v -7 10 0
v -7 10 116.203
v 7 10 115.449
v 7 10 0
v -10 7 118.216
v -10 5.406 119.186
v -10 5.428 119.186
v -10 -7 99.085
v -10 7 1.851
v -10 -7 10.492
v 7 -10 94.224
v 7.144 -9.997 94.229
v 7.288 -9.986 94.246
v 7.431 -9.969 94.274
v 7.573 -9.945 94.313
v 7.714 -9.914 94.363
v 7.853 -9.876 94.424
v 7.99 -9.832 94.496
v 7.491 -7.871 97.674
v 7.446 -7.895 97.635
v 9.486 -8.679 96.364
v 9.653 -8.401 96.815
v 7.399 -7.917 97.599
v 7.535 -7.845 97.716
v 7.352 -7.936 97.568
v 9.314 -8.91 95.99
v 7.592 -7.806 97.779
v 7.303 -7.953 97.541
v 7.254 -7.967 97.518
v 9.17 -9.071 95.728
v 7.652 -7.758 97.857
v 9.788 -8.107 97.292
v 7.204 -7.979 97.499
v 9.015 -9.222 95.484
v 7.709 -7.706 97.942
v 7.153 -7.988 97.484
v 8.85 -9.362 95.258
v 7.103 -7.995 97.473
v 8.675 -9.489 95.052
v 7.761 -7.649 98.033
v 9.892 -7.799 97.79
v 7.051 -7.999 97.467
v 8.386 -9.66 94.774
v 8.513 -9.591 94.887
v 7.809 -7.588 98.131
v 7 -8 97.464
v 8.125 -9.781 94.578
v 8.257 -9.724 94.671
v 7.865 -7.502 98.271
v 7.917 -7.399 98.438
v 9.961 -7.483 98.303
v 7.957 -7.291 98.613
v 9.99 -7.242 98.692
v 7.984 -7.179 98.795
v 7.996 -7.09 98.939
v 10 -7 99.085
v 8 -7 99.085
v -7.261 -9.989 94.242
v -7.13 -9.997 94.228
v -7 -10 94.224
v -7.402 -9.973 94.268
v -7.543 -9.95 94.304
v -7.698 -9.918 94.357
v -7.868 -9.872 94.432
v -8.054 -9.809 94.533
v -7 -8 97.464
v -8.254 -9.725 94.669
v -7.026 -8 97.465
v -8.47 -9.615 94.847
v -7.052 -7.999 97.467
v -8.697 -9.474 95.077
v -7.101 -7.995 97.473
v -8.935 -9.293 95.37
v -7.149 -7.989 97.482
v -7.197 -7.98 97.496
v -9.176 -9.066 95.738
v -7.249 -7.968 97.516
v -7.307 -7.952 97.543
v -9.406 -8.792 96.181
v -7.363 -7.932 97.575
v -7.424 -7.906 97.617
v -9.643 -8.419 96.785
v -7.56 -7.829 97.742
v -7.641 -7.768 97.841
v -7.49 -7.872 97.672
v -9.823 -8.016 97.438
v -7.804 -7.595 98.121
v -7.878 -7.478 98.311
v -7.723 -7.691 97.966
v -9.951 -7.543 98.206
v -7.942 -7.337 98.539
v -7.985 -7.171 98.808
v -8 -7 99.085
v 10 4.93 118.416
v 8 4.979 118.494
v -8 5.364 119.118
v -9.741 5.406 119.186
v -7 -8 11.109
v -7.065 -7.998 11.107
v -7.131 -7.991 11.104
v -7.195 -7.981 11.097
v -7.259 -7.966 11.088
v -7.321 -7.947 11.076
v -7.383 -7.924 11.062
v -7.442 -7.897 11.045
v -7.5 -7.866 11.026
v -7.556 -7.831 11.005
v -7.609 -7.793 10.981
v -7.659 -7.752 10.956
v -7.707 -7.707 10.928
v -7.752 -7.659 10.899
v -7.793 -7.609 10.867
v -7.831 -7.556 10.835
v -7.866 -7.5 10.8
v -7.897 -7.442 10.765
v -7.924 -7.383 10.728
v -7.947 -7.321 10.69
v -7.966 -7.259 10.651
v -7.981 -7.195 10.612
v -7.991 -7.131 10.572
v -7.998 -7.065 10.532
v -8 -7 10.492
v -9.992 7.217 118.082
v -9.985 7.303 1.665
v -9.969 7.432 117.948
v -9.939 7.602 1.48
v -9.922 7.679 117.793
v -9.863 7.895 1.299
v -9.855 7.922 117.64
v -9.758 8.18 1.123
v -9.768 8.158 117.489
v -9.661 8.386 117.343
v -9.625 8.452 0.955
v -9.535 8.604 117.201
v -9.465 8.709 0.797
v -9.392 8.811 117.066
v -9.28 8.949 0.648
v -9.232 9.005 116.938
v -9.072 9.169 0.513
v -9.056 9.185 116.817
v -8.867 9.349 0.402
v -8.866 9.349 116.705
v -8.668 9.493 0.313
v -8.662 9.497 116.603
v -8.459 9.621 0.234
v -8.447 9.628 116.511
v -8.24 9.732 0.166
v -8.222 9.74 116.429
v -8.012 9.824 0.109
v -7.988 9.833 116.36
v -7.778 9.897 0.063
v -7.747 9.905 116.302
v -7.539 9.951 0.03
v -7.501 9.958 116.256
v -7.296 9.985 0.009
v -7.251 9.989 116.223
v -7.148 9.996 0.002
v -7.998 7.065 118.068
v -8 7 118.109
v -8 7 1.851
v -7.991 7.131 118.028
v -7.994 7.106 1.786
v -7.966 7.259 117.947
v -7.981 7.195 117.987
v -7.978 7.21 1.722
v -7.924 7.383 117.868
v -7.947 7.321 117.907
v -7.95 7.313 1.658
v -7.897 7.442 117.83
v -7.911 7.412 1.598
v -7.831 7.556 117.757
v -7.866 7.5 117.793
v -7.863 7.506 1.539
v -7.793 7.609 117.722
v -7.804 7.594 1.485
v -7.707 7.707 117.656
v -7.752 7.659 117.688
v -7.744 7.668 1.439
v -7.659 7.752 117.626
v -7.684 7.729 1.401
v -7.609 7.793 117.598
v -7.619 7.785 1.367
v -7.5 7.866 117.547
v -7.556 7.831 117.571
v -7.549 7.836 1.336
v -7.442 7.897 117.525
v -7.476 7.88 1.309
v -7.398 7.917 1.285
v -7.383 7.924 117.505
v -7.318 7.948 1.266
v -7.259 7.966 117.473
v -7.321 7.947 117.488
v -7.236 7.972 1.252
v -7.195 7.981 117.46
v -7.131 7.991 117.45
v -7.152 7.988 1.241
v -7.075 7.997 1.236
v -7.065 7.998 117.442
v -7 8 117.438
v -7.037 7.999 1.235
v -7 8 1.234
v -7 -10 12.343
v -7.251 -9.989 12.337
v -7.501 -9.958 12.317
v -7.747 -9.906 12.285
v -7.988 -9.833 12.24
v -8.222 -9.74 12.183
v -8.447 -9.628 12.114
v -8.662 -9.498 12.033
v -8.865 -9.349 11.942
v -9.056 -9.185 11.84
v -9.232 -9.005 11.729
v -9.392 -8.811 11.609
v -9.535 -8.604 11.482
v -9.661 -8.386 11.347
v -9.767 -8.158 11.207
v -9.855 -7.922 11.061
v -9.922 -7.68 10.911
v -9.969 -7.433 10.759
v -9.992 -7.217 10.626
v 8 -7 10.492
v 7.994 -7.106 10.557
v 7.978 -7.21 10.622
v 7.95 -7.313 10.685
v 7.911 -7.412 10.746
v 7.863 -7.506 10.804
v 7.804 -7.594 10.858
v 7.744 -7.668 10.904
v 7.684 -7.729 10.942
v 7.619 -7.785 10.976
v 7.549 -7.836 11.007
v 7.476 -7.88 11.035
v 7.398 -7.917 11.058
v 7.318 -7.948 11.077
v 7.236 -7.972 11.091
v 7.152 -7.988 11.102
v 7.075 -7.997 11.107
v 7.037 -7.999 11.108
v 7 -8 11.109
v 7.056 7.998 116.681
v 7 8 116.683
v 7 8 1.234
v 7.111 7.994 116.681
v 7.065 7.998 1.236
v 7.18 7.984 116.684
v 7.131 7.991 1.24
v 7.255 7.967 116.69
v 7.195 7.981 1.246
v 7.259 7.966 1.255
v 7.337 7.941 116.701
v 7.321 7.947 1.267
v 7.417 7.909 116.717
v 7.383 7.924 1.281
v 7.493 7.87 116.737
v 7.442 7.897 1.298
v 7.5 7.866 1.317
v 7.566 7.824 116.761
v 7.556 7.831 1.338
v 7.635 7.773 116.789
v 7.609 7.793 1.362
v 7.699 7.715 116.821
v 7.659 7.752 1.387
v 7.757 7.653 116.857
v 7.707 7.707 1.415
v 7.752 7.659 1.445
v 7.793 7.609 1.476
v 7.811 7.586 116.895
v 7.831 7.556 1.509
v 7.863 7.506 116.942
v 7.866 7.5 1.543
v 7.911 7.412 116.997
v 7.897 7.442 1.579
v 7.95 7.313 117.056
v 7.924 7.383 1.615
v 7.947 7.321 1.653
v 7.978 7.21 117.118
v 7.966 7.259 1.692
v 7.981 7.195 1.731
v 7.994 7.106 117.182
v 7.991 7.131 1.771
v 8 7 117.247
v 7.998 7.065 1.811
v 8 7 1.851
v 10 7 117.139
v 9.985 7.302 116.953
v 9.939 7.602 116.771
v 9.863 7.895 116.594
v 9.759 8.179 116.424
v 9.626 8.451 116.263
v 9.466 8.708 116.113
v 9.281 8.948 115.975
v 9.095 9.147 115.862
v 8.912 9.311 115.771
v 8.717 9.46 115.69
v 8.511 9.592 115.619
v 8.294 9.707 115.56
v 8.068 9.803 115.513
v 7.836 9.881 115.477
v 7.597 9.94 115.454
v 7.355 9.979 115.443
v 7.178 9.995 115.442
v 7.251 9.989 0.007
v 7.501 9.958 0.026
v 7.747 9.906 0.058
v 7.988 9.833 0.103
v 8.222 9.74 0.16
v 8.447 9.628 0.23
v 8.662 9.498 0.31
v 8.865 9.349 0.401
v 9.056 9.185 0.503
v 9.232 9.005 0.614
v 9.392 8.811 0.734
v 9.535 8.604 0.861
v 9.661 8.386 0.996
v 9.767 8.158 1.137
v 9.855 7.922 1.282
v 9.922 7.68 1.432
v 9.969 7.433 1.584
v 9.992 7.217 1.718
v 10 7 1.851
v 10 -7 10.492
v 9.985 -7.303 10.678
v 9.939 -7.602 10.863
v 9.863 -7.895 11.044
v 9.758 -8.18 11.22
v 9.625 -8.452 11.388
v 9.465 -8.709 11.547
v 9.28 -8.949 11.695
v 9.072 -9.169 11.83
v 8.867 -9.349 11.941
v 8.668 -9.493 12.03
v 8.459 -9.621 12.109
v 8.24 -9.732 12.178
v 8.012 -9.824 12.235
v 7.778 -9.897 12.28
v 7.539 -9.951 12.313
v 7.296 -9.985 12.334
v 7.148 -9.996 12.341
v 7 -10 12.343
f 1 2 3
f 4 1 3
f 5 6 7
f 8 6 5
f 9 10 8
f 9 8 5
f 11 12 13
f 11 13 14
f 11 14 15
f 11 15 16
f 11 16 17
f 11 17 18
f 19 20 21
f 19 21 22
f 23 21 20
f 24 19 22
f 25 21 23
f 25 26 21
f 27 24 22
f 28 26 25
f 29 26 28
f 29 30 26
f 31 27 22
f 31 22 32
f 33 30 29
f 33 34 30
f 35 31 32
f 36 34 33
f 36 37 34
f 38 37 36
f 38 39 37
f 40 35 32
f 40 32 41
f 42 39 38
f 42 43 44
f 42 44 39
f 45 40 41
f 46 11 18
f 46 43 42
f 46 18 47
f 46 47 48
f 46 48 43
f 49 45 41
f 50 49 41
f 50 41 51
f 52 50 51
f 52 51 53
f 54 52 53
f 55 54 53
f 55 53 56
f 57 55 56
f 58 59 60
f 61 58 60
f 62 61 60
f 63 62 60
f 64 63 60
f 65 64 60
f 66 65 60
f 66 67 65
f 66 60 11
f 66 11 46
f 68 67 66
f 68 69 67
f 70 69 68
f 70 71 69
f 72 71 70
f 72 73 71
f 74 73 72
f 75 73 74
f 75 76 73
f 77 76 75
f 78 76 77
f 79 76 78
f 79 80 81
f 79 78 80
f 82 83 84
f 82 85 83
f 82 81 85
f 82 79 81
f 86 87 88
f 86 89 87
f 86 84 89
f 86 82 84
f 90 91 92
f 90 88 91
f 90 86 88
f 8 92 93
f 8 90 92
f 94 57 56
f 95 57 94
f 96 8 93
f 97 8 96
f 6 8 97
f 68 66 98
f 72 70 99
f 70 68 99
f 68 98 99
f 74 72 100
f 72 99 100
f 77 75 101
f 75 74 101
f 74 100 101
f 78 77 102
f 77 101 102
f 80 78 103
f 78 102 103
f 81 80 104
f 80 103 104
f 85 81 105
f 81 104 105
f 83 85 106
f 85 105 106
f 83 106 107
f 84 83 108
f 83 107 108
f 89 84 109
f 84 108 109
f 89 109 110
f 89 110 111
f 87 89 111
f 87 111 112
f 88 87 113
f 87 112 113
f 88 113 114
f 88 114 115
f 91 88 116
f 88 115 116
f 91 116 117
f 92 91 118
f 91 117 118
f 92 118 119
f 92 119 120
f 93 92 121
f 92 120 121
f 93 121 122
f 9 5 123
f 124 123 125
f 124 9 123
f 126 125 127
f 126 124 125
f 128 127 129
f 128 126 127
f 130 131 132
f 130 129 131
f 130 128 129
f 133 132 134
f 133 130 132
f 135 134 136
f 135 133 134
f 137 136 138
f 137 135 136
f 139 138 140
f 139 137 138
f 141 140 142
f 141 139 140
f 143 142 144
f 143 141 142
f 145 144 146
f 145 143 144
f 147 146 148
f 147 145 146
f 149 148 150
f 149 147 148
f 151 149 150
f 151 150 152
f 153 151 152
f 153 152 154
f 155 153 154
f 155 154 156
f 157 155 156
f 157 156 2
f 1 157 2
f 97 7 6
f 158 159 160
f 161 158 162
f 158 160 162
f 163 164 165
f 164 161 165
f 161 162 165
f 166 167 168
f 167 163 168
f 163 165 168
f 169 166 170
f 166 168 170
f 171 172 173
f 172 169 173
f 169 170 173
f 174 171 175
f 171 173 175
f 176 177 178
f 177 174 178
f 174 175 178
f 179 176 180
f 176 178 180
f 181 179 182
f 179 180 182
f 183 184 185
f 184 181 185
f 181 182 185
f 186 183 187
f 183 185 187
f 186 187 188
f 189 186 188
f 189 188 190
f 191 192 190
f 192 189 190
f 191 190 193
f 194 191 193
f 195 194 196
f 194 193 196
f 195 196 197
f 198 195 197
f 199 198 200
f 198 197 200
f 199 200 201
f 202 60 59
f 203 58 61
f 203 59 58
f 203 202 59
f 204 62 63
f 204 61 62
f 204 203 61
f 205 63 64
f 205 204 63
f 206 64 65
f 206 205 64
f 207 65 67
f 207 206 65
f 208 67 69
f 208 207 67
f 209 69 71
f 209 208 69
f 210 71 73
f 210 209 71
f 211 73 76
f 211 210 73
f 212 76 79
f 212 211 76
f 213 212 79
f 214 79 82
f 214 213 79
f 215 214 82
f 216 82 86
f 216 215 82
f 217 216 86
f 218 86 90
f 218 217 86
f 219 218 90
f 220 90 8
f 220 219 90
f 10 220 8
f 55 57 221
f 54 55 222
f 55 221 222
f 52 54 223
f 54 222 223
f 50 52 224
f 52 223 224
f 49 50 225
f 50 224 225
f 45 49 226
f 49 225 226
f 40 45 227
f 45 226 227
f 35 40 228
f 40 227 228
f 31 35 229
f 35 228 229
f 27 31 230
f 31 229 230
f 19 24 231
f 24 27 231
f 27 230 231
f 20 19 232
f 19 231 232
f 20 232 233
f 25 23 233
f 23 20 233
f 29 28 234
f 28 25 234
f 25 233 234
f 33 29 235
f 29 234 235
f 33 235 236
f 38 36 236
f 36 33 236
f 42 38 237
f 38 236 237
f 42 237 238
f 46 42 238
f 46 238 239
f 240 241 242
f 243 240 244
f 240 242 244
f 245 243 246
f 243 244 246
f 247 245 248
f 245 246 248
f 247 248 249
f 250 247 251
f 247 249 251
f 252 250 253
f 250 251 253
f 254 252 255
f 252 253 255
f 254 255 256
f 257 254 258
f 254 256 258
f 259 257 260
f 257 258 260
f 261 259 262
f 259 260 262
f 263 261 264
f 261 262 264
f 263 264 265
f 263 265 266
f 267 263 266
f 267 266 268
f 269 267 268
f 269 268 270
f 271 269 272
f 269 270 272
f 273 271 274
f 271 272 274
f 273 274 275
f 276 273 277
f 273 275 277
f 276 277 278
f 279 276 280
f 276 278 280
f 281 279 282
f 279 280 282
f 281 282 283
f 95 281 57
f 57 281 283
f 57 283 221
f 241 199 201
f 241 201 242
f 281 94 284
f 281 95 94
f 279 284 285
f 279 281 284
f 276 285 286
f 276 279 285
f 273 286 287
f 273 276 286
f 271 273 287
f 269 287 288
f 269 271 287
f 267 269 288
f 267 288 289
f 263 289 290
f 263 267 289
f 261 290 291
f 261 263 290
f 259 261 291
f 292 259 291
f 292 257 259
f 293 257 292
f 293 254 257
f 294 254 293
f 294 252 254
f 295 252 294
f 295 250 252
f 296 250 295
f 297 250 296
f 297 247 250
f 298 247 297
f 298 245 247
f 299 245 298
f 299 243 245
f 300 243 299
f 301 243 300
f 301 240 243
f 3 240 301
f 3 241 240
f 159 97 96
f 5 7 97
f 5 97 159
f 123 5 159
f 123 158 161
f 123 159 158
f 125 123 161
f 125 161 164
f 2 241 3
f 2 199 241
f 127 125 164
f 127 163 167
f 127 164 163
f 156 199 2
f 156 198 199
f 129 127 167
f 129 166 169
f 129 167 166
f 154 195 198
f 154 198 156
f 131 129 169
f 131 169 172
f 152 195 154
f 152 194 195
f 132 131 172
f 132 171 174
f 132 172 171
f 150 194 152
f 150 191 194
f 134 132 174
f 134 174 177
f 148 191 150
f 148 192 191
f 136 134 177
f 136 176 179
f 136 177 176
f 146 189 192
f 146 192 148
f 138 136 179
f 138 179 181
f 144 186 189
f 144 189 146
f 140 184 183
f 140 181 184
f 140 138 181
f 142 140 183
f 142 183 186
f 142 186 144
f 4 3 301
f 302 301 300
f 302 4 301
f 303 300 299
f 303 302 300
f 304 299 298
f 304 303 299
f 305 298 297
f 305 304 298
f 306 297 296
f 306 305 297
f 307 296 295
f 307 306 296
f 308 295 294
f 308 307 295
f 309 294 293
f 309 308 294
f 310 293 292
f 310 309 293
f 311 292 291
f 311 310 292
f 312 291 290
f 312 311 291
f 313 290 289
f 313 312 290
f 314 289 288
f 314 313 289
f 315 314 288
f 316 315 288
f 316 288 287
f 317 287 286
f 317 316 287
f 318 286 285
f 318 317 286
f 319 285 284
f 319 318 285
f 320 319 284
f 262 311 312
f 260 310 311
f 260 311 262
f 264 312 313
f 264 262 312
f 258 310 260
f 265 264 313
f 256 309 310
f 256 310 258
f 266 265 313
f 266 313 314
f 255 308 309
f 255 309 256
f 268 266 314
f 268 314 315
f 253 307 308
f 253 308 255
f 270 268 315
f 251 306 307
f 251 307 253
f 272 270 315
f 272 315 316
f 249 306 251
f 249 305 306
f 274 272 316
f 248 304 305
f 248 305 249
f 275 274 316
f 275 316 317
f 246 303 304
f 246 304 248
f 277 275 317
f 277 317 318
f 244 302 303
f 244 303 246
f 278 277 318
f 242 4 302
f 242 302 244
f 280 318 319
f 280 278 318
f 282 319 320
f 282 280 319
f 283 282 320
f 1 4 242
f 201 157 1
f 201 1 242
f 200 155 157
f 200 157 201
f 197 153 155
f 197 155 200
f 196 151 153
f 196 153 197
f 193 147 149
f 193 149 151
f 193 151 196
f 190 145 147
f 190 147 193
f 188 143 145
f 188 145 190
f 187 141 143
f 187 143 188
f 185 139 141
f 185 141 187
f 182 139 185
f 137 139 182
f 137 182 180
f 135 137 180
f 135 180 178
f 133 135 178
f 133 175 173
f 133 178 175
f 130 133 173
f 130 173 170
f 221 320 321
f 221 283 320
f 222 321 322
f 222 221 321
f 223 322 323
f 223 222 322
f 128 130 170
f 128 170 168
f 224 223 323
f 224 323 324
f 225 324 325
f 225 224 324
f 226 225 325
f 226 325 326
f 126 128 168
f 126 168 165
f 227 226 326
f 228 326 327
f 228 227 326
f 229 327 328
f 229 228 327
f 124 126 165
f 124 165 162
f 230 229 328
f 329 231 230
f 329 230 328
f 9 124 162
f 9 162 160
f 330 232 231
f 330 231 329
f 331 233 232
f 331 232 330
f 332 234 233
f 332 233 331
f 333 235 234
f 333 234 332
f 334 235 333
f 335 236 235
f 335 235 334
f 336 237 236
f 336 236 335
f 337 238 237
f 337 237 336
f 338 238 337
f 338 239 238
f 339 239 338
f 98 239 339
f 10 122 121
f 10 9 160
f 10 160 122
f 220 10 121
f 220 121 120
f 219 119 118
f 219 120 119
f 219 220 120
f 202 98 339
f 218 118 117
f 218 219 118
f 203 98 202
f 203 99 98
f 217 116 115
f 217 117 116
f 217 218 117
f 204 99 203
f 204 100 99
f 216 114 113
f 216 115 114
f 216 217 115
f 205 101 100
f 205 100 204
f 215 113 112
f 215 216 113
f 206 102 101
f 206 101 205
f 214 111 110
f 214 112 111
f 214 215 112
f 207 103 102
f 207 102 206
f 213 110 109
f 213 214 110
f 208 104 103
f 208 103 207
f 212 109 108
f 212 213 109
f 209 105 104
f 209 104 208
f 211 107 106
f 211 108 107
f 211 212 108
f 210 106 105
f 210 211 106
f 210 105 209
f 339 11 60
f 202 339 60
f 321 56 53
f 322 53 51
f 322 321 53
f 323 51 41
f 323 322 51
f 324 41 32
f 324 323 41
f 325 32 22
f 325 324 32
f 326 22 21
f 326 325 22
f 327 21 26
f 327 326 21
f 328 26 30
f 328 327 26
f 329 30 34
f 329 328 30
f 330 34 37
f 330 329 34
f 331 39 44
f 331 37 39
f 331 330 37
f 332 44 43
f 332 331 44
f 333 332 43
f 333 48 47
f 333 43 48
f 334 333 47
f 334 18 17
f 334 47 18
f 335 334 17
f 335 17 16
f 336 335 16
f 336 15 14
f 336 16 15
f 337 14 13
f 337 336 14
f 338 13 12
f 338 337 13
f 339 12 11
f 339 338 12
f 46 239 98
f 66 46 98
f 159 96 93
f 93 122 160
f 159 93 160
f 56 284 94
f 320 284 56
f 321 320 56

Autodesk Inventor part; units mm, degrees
ref_plane "Start Plane" through (0, 0, 0) normal (0, 0, 1) x (1, 0, 0)
ref_plane "End Plane" through (0, 0, 119.1864) normal (0, 0, 1) x (1, 0, 0)
sketch "Sketch" plane through (0, 0, 0) normal (0, 0, 1) x (1, 0, 0)
  line L0 (-10, -7) -> (-10, 7)
  line L1 (-7, 10) -> (7, 10)
  line L2 (10, 7) -> (10, -7)
  line L3 (7, -10) -> (-7, -10)
  arc A0 (-10, -7) -> (-7, -10) centre (-7, -7) ccw
  arc A1 (-7, 10) -> (-10, 7) centre (-7, 7) ccw
  arc A2 (10, 7) -> (7, 10) centre (7, 7) ccw
  arc A3 (7, -10) -> (10, -7) centre (7, -7) ccw
  arc A4 (-7, 8) -> (-8, 7) centre (-7, 7) ccw
  line L4 (-7, 8) -> (7, 8)
  arc A5 (8, 7) -> (7, 8) centre (7, 7) ccw
  line L5 (8, 7) -> (8, -7)
  arc A6 (7, -8) -> (8, -7) centre (7, -7) ccw
  line L6 (7, -8) -> (-7, -8)
  arc A7 (-8, -7) -> (-7, -8) centre (-7, -7) ccw
  line L7 (-8, -7) -> (-8, 7)
  line L8 (0, 14.8698) -> (0, -14.8698) construction
  line L9 (-14.8698, 0) -> (14.8698, 0) construction
  dimension "d7" = 3
  dimension "d10" = 20
  dimension "d11" = 20
  dimension "d12" = 2
  dimension "d15" = 10
  dimension "d16" = 10
extrude "Body" add sketch "Sketch" along normal up to surface (119.1864 mm away) from surface at 0
sketch "Sketch3" plane through (0, 0, 0) normal (0, 0, 1) x (1, 0, 0)
  line L0 (0, 0) -> (10, 0)
ref_plane "Work Plane3" through (0, 0, 0) normal (0, -1, 0) x (1, 0, 0)
sketch "Sketch4" plane through (0, 0, 0) normal (0, -1, 0) x (1, 0, 0)
  line L0 (-2, 0) -> (12, 0)
  line L1 (-2, 119.1864) -> (12, 119.1864)
  dimension "d18" = 119.1864
ref_plane "Work Plane5" through (-3.5, 10, 0) normal (0, -0.5252, -0.851) x (1, 0, 0)
ref_plane "Work Plane4" through (-4.3884, -35.4353, -90.7271) normal (0, -0.851, 0.5252) x (-0.999, 0.024, 0.0389)
split "Split1" plane through (-3.5, 10, 0) removes the side toward (0, -0.5252, -0.851)
ref_plane "Work Plane6" through (223.7362, -9.1535, 95.5954) normal (0, -0.851, 0.5252) x (1, 0, 0)
split "Split2" plane through (223.7362, -9.1535, 95.5954) removes the side toward (0, -0.851, 0.5252)
ref_plane "Work Plane7" through (224.514, -2.7866, 111.6222) normal (0.0458, 0.5247, 0.8501) x (0.9989, -0.013, -0.0458)
split "Split3" plane through (224.514, -2.7866, 111.6222) removes the side toward (0.0458, 0.5247, 0.8501)
equation "\"d7\" = G_IR"
equation "\"d10\" = G_H"
equation "\"d11\" = G_W"
equation "\"d12\" = G_T"
equation "\"d15\" = 0.5 * d10"
equation "\"d16\" = 0.5 * d11"
equation "\"d3\" = G_L"
equation "\"G_W\" = 20"
equation "\"G_H\" = 20"
equation "\"G_T\" = 2"
equation "\"G_IR\" = 3"
equation "\"G_L\" = d18"
equation "\"G_OFFSET_START\" = 0"
equation "\"G_OFFSET_END\" = 8.90098"
equation "\"d14\" = G_OFFSET_END + B_L"
equation "\"B_L\" = 110.28541"
properties part number "ISO 12633-2 - 20x20x2 - 119.19" material "Steel, Mild"
